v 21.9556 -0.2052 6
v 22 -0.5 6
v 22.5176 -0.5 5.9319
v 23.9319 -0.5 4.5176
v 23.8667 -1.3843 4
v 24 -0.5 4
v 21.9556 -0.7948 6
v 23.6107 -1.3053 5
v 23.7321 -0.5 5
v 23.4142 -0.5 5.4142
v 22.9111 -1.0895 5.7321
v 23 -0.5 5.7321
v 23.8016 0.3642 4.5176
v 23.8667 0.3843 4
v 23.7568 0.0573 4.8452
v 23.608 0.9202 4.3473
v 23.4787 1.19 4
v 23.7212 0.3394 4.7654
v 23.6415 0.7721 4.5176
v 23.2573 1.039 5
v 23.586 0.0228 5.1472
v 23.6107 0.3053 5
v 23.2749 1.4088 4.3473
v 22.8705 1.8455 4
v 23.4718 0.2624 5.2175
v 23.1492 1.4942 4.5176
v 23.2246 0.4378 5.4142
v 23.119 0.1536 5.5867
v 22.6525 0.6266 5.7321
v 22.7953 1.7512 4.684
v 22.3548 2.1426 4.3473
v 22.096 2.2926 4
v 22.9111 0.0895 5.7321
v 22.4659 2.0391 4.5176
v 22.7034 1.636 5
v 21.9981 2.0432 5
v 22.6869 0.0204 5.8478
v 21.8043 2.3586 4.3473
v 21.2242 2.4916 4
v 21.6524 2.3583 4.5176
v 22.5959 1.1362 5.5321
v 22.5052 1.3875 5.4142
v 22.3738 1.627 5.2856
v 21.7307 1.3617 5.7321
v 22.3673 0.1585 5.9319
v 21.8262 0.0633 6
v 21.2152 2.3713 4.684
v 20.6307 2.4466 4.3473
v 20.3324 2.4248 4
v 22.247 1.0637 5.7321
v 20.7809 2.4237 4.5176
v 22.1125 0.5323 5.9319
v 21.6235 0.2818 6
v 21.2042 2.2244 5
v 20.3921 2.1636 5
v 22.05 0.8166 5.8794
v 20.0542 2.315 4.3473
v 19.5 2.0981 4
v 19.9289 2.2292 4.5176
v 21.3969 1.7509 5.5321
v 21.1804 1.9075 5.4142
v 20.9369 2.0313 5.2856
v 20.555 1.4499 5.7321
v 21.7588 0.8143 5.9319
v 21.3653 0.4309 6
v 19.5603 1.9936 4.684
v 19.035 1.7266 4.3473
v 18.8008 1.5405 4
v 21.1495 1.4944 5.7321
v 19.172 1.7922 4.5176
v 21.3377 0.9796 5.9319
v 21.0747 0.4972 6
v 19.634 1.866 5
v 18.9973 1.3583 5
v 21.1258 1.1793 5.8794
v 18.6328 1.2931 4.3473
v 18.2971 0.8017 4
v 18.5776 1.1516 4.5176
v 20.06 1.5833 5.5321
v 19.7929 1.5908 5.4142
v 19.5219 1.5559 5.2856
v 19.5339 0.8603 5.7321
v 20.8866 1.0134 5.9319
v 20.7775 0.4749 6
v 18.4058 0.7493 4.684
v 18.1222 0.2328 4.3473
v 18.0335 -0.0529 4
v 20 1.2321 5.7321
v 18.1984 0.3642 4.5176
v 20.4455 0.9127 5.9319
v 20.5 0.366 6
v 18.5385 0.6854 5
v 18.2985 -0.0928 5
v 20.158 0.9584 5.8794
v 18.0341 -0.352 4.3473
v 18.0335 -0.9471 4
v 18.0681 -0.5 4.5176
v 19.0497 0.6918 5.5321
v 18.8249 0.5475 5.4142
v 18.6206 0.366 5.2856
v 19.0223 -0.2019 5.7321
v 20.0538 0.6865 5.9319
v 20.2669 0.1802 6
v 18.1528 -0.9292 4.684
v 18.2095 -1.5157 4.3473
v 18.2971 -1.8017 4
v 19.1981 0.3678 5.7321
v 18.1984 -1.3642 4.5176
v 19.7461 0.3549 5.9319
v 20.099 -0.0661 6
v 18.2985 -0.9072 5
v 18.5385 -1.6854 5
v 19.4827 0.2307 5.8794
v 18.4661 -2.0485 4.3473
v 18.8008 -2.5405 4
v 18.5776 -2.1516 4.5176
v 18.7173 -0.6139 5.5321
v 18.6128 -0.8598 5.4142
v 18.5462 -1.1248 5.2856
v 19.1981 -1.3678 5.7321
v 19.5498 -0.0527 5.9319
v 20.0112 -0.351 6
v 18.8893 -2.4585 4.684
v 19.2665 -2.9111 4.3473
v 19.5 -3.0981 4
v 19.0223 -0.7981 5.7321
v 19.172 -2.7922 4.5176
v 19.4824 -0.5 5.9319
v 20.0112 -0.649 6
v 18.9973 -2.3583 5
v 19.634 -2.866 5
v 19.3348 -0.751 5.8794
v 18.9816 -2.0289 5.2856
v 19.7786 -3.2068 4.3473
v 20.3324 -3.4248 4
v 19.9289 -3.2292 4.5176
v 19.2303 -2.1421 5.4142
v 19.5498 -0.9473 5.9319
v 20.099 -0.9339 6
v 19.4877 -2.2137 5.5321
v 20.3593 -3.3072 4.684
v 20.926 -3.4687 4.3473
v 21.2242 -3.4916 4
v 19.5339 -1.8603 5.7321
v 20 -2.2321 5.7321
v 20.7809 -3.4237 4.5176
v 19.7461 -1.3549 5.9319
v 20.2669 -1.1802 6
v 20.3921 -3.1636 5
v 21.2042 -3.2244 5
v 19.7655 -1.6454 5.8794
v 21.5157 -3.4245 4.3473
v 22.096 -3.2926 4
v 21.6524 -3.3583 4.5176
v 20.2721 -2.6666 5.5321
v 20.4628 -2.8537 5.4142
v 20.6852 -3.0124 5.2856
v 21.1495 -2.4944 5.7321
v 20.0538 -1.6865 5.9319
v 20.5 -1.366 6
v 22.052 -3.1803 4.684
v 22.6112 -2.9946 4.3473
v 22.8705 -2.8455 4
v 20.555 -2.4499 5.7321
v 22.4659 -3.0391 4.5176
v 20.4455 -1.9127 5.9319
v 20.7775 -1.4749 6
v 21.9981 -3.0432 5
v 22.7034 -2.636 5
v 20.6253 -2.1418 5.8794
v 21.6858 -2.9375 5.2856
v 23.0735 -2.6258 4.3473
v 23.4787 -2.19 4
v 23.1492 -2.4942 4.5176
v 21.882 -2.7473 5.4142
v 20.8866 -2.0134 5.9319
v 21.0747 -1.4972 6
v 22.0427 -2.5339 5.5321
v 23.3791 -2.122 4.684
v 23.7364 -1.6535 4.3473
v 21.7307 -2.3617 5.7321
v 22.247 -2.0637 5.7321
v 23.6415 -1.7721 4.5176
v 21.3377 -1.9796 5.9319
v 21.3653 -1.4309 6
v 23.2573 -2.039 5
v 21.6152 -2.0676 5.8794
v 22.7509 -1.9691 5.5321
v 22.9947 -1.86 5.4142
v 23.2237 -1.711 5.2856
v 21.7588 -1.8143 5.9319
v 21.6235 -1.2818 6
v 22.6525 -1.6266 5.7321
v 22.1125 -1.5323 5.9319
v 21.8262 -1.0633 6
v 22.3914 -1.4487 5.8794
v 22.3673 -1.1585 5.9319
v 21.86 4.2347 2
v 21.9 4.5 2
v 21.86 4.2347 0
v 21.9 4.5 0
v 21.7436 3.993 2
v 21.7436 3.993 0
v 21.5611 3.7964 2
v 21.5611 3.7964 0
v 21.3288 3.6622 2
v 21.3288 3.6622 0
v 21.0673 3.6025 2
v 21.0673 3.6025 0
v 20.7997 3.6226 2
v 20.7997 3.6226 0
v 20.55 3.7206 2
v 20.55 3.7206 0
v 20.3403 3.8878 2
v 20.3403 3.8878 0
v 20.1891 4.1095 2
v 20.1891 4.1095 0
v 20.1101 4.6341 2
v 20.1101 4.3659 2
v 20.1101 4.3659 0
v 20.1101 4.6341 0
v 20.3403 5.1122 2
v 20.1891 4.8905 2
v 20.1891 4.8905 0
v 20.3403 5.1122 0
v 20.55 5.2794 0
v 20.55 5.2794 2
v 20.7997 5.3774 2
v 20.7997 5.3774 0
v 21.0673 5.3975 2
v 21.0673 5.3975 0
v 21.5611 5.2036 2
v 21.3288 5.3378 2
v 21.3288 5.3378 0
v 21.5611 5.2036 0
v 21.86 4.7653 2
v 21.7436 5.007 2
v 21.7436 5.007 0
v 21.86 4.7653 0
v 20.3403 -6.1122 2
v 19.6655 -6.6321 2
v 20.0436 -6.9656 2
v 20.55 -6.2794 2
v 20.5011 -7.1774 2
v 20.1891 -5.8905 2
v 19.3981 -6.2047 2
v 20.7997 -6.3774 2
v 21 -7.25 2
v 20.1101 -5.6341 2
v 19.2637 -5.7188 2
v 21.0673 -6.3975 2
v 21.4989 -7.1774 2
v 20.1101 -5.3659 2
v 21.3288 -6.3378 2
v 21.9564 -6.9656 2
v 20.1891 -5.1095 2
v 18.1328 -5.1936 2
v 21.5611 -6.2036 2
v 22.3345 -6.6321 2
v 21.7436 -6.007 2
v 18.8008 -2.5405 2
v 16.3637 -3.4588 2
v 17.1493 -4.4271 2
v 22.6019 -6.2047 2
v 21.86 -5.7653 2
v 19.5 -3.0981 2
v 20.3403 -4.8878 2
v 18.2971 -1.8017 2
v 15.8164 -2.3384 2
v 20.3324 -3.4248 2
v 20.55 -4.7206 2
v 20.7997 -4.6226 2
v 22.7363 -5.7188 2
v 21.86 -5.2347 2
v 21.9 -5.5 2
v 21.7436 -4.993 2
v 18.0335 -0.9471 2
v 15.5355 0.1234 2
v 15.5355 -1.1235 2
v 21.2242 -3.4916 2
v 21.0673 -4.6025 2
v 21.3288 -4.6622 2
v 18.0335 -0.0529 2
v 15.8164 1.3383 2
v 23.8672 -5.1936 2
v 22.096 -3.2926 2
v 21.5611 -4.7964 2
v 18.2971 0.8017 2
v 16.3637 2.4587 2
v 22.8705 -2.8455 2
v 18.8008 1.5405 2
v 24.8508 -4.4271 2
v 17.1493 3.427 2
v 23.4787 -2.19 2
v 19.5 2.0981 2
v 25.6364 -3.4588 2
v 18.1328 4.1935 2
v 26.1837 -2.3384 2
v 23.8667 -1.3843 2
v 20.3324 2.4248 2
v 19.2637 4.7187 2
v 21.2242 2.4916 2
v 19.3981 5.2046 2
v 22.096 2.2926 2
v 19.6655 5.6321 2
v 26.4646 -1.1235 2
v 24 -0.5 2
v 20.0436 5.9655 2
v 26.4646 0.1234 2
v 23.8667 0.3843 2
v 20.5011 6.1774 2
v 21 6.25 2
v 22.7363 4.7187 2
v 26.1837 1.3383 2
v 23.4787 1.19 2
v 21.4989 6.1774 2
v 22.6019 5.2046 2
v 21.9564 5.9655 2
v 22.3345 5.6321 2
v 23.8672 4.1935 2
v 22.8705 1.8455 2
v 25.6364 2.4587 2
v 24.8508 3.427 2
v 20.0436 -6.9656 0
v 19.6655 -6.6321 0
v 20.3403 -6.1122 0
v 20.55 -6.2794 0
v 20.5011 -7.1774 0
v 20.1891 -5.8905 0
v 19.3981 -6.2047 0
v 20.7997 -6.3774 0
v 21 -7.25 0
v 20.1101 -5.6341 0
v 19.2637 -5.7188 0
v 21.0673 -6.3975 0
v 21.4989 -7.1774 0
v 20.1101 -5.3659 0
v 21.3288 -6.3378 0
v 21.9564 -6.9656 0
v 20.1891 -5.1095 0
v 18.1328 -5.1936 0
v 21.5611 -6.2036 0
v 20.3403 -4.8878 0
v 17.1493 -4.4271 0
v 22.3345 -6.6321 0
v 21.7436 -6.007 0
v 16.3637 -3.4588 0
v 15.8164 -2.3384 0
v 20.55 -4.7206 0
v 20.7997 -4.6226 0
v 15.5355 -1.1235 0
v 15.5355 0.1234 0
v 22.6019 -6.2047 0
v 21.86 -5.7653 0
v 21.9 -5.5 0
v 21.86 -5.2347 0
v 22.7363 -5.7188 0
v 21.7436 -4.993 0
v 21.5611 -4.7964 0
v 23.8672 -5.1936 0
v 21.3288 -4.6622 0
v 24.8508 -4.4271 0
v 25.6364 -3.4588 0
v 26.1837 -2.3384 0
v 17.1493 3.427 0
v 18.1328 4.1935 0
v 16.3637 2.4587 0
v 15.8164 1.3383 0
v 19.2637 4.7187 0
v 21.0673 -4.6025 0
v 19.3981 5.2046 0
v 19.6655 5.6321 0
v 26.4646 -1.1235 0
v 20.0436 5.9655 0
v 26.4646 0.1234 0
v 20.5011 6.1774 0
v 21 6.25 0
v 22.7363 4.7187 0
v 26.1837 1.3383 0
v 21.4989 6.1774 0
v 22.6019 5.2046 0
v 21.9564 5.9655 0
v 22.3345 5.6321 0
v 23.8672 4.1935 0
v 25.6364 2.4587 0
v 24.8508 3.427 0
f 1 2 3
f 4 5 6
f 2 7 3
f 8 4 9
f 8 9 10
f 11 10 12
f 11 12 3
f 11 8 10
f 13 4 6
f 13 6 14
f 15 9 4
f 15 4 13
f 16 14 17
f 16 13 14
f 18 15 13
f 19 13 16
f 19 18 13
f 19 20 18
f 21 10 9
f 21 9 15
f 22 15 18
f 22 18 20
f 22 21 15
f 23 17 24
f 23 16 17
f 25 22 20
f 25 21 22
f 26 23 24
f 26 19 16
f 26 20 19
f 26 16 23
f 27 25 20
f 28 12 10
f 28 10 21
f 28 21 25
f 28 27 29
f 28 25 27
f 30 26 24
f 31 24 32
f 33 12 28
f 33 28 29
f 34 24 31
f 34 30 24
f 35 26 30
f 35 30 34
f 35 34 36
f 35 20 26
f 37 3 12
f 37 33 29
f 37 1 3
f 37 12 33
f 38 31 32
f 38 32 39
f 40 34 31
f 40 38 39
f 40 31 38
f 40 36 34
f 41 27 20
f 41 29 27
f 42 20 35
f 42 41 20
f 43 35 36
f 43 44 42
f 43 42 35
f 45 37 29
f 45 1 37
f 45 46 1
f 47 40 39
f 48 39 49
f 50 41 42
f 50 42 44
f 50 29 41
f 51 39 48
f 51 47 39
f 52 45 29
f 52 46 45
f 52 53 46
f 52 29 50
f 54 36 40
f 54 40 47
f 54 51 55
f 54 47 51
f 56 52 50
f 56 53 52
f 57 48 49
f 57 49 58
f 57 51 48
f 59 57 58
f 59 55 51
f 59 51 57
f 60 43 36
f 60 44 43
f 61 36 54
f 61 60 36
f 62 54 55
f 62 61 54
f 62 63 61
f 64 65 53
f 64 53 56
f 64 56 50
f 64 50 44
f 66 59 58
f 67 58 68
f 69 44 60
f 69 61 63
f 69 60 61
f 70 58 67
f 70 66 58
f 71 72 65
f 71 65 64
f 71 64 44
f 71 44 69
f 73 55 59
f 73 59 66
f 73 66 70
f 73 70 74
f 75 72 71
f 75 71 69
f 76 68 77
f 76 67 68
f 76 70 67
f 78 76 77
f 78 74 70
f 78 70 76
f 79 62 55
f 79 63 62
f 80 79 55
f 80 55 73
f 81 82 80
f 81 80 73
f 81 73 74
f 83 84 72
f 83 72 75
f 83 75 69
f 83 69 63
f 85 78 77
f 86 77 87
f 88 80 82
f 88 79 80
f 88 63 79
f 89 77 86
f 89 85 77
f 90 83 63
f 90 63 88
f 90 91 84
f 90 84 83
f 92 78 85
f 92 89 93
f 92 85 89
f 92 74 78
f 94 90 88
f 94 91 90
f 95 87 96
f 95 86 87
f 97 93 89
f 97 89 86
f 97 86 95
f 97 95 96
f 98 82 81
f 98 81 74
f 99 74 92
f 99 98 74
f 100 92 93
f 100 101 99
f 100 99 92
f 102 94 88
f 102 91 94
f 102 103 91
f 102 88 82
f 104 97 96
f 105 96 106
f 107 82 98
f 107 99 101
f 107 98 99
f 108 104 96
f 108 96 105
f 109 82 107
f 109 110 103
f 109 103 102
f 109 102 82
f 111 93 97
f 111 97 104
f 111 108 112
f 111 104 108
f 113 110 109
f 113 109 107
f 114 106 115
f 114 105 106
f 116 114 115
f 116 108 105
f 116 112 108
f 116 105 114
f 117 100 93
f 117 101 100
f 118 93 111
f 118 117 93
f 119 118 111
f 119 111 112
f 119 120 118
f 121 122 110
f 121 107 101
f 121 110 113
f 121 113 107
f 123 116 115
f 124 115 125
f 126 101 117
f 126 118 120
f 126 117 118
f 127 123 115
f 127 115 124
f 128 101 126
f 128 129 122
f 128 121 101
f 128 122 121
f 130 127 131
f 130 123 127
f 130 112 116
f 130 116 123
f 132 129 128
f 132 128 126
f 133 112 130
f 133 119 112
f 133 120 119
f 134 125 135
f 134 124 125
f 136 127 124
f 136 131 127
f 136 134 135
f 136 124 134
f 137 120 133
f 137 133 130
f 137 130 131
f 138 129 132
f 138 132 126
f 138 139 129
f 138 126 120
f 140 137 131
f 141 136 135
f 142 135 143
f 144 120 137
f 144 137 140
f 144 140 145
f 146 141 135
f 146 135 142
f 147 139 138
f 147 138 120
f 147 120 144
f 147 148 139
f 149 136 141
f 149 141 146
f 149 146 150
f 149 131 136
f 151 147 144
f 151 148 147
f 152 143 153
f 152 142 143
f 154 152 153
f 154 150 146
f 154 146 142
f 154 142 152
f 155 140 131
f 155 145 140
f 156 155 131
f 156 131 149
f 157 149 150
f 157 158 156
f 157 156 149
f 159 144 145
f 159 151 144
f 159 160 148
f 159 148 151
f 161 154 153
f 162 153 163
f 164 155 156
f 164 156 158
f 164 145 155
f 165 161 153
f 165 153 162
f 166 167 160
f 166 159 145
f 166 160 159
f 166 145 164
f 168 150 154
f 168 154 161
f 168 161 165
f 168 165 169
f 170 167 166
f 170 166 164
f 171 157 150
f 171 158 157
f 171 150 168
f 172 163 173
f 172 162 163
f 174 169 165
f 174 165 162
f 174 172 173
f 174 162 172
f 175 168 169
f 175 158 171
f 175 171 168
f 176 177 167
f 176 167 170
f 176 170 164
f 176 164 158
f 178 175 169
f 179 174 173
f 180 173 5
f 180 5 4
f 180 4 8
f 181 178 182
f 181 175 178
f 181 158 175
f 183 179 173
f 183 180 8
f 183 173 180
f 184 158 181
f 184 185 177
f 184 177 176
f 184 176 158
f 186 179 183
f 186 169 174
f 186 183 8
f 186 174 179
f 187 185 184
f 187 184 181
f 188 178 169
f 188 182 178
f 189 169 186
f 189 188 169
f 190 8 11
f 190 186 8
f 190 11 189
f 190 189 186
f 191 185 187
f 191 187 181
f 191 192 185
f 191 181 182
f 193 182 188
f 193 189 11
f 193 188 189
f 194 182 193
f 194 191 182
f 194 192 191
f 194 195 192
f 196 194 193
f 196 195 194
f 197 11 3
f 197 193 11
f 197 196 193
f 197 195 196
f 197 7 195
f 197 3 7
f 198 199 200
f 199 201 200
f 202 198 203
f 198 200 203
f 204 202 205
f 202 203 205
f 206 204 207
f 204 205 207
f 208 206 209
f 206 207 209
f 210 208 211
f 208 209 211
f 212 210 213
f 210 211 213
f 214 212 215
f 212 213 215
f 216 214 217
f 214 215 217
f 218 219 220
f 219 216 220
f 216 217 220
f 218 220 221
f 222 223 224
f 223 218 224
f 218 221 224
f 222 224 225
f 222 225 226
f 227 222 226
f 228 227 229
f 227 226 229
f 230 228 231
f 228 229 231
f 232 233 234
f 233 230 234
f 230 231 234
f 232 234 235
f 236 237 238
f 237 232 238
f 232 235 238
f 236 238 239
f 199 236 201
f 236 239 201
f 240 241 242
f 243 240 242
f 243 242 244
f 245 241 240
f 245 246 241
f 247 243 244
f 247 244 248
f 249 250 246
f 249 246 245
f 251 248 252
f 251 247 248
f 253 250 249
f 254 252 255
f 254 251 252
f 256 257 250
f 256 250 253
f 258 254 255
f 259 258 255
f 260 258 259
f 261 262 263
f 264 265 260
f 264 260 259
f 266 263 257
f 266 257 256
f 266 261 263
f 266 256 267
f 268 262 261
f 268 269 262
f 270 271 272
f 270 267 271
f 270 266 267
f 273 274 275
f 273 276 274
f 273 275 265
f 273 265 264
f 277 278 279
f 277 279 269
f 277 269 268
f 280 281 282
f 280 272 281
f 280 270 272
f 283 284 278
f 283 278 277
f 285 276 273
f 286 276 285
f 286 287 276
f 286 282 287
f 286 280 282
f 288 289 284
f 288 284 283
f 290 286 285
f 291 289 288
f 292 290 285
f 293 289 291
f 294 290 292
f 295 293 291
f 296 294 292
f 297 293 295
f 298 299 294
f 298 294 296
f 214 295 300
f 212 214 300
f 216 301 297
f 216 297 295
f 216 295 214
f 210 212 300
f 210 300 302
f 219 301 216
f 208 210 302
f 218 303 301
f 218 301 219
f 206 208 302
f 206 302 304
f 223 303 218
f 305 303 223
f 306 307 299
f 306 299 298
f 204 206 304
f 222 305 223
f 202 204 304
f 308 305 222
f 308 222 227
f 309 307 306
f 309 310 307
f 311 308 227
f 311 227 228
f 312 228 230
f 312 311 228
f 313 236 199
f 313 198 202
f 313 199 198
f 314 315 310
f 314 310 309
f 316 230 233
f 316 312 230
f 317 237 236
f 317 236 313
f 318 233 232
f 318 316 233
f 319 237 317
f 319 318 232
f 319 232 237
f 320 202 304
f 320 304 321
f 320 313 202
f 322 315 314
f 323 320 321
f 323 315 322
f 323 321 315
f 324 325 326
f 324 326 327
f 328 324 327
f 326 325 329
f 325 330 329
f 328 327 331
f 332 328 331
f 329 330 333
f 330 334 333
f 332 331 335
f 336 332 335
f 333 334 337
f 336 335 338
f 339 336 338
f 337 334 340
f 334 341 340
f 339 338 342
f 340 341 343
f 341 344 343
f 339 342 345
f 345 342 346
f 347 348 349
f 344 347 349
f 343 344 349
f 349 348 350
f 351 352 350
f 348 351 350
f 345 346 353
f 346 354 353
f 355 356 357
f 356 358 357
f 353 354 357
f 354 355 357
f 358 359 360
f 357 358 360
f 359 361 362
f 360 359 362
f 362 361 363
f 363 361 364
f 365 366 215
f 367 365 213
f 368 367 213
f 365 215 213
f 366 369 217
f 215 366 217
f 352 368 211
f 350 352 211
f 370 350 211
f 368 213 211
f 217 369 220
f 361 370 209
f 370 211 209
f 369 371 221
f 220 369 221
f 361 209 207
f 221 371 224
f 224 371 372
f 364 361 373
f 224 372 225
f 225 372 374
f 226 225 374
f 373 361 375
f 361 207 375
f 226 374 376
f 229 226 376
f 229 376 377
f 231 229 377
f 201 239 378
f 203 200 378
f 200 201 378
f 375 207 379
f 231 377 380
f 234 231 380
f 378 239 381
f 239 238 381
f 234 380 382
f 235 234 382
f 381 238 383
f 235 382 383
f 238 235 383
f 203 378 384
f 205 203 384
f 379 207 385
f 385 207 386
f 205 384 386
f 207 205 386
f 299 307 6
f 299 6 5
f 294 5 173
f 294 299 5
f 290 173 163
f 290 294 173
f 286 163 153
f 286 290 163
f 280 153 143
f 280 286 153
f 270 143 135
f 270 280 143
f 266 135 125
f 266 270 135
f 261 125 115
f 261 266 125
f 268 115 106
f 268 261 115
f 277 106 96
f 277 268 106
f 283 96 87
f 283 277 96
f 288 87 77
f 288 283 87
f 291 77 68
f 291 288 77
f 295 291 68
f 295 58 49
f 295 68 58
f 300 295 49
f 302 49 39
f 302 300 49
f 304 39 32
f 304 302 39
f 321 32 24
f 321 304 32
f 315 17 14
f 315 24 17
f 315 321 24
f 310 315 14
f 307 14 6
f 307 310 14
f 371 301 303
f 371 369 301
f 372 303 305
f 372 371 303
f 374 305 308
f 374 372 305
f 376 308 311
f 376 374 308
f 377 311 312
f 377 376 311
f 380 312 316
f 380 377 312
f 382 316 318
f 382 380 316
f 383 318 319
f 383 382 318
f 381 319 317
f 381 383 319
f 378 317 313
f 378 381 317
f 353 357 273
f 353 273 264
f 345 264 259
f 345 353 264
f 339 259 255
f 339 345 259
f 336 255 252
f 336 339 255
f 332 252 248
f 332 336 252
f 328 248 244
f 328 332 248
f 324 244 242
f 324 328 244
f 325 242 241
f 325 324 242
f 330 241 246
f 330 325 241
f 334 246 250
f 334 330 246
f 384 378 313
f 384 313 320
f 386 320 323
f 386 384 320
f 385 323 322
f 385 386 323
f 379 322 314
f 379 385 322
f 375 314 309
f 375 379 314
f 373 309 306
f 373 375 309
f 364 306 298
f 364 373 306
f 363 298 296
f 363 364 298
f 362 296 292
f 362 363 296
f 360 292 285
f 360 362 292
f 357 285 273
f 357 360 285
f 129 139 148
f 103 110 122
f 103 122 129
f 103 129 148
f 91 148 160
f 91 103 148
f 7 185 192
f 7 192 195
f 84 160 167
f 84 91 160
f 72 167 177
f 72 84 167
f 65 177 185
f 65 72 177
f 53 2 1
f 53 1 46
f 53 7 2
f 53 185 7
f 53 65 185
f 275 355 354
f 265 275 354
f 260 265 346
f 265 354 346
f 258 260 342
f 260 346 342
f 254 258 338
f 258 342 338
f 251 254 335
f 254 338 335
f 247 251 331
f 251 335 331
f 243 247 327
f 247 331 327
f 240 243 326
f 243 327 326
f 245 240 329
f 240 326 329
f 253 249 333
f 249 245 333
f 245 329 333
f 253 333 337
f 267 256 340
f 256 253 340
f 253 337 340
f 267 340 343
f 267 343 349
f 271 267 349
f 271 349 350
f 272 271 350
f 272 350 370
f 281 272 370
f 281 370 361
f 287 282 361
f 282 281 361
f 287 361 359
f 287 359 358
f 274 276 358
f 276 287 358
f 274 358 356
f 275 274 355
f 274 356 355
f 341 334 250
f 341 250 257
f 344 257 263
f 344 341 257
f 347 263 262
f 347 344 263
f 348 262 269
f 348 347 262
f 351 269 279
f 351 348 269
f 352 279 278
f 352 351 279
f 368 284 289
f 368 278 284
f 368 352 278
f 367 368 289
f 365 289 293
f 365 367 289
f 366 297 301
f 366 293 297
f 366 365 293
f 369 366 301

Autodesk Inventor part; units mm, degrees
ref_plane "YZ Plane" through (0, 0, 0) normal (1, 0, 0) x (0, 1, 0)
ref_plane "XZ Plane" through (0, 0, 0) normal (0, 1, 0) x (-1, 0, 0)
ref_plane "XY Plane" through (0, 0, 0) normal (0, 0, 1) x (1, 0, 0)
sketch "스케치1" plane through (0, 0, 0) normal (0, 0, 1) x (1, 0, 0)
  line L0 (-24.8745, -28.5) -> (-24.8745, -22.5) projected
  line L1 (-24.8745, -22.5) -> (-24.6915, -22.5) projected
  line L2 (4.8745, -22.5) -> (4.8745, -28.5) projected
  line L3 (30, -28.5) -> (4.8745, -28.5) projected
  line L4 (30, 27.5) -> (30, -28.5) projected
  line L5 (30, 27.5) -> (4.8745, 27.5) projected
  line L6 (4.8745, 27.5) -> (4.8745, 21.5) projected
  line L7 (-24.6915, 21.5) -> (-24.8745, 21.5) projected
  line L8 (-24.8745, 21.5) -> (-24.8745, 27.5) projected
  line L9 (17, -7.5) -> (25, -7.5)
  line L10 (25, -7.5) -> (25, 6.5)
  line L11 (25, 6.5) -> (17, 6.5)
  line L12 (17, 6.5) -> (17, -7.5)
  arc A0 (19.7598, -5.3438) -> (22.2402, -5.3438) centre (21, -5.5) ccw
  arc A1 (22.2402, 4.3437) -> (19.7598, 4.3437) centre (21, 4.5) ccw
  circle A2 centre (21, -5.5) radius 0.9
  circle A3 centre (21, 4.5) radius 0.9
  arc A4 (19.7598, 4.3437) -> (19.7598, -5.3438) centre (21, -0.5) ccw
  arc A5 (22.2402, -5.3438) -> (22.2402, 4.3437) centre (21, -0.5) ccw
  circle A6 centre (21, -5.5) radius 0.9 projected
  circle A7 centre (21, 4.5) radius 0.9 projected
  line L13 (-21.6915, -12.5) -> (-21.6915, 11.5) projected
  line L14 (4, 11.5) -> (4, -12.5) projected
  line L15 (-24.8745, 27.5) -> (-33, 27.5) projected
  line L16 (-33, -28.5) -> (-33, 27.5) projected
  line L17 (-24.8745, -28.5) -> (-33, -28.5) projected
  line L18 (7, -22.5) -> (4.8745, -22.5) projected
  line L19 (4.8745, 21.5) -> (7, 21.5) projected
  line L20 (7, 21.5) -> (7, 20) projected
  line L21 (7, 20) -> (-24.6915, 20) projected
  line L22 (-24.6915, 20) -> (-24.6915, 21.5) projected
  line L23 (-24.6915, -22.5) -> (-24.6915, -21) projected
  line L24 (-24.6915, -21) -> (7, -21) projected
  line L25 (7, -21) -> (7, -22.5) projected
  line L26 (4, -12.5) -> (-21.6915, -12.5) projected
  line L27 (-21.6915, 11.5) -> (4, 11.5) projected
  point P0 (0, 0)
  dimension "d0" = 8
  dimension "d1" = 5
  dimension "d2" = 14
  dimension "d3" = 56
  dimension "d4" = 21
  dimension "d5" = 2.5
  dimension "d6" = 2.5
  dimension "d7" = 10
  dimension "d8" = 2
  dimension "d9" = 4
  dimension "d10" = 4
  dimension "d11" = 1.8
  dimension "d12" = 1.8
  dimension "d13" = 21
  dimension "d14" = 2
extrude "돌출1" add sketch "스케치1" along normal blind 1 contours A4 L12 | L12 A4 A1 A5 L10 A0 | L10 A5
sketch "스케치2" plane through (0, 0, 1) normal (0, 0, 1) x (1, 0, 0)
  arc A0 (19.7598, 4.3437) -> (19.7598, -5.3438) centre (21, -0.5) ccw projected
  arc A1 (22.2402, 4.3437) -> (19.7598, 4.3437) centre (21, 4.5) ccw projected
  arc A2 (22.2402, -5.3438) -> (22.2402, 4.3437) centre (21, -0.5) ccw projected
  arc A3 (19.7598, -5.3438) -> (22.2402, -5.3438) centre (21, -5.5) ccw projected
  arc A4 (19.2637, 4.7187) -> (19.2637, -5.7188) centre (21, -0.5) ccw
  arc A5 (22.7363, 4.7187) -> (19.2637, 4.7187) centre (21, 4.5) ccw
  arc A6 (22.7363, -5.7188) -> (22.7363, 4.7187) centre (21, -0.5) ccw
  arc A7 (19.2637, -5.7188) -> (22.7363, -5.7188) centre (21, -5.5) ccw
  point P0 (0, 0)
  dimension "d17" = 0.5
extrude "돌출2" add sketch "스케치2" against normal blind 1
sketch "스케치3" plane through (0, 0, 1) normal (0, 0, 1) x (1, 0, 0)
  arc A0 (19.2637, 4.7187) -> (19.2637, -5.7188) centre (21, -0.5) ccw projected
  arc A1 (19.2637, -5.7188) -> (22.7363, -5.7188) centre (21, -5.5) ccw projected
  arc A2 (22.7363, -5.7188) -> (22.7363, 4.7187) centre (21, -0.5) ccw projected
  arc A3 (22.7363, 4.7187) -> (19.2637, 4.7187) centre (21, 4.5) ccw projected
  circle A4 centre (21, 4.5) radius 0.9 projected
  circle A5 centre (21, -5.5) radius 0.9 projected
  point P0 (0, 0)
extrude "돌출3" add sketch "스케치3" along normal blind 1
sketch "스케치4" plane through (0, 0, 2) normal (0, 0, 1) x (1, 0, 0)
  circle A0 centre (21, -5.5) radius 0.9 projected
  circle A1 centre (21, 4.5) radius 0.9 projected
  arc A2 (19.2637, 4.7187) -> (19.2637, -5.7188) centre (21, -0.5) ccw projected
  arc A3 (19.2637, -5.7188) -> (22.7363, -5.7188) centre (21, -5.5) ccw projected
  arc A4 (22.7363, -5.7188) -> (22.7363, 4.7187) centre (21, -0.5) ccw projected
  arc A5 (22.7363, 4.7187) -> (19.2637, 4.7187) centre (21, 4.5) ccw projected
  circle A6 centre (21, -0.5) radius 3
  point P0 (0, 0)
  dimension "d22" = 6
extrude "돌출4" add sketch "스케치4" along normal blind 4 contours A6
fillet "모깎기1" radius 2 1 edges at (18, -0.5, 6)
properties part number "candynamix_mini_ballcaster"
